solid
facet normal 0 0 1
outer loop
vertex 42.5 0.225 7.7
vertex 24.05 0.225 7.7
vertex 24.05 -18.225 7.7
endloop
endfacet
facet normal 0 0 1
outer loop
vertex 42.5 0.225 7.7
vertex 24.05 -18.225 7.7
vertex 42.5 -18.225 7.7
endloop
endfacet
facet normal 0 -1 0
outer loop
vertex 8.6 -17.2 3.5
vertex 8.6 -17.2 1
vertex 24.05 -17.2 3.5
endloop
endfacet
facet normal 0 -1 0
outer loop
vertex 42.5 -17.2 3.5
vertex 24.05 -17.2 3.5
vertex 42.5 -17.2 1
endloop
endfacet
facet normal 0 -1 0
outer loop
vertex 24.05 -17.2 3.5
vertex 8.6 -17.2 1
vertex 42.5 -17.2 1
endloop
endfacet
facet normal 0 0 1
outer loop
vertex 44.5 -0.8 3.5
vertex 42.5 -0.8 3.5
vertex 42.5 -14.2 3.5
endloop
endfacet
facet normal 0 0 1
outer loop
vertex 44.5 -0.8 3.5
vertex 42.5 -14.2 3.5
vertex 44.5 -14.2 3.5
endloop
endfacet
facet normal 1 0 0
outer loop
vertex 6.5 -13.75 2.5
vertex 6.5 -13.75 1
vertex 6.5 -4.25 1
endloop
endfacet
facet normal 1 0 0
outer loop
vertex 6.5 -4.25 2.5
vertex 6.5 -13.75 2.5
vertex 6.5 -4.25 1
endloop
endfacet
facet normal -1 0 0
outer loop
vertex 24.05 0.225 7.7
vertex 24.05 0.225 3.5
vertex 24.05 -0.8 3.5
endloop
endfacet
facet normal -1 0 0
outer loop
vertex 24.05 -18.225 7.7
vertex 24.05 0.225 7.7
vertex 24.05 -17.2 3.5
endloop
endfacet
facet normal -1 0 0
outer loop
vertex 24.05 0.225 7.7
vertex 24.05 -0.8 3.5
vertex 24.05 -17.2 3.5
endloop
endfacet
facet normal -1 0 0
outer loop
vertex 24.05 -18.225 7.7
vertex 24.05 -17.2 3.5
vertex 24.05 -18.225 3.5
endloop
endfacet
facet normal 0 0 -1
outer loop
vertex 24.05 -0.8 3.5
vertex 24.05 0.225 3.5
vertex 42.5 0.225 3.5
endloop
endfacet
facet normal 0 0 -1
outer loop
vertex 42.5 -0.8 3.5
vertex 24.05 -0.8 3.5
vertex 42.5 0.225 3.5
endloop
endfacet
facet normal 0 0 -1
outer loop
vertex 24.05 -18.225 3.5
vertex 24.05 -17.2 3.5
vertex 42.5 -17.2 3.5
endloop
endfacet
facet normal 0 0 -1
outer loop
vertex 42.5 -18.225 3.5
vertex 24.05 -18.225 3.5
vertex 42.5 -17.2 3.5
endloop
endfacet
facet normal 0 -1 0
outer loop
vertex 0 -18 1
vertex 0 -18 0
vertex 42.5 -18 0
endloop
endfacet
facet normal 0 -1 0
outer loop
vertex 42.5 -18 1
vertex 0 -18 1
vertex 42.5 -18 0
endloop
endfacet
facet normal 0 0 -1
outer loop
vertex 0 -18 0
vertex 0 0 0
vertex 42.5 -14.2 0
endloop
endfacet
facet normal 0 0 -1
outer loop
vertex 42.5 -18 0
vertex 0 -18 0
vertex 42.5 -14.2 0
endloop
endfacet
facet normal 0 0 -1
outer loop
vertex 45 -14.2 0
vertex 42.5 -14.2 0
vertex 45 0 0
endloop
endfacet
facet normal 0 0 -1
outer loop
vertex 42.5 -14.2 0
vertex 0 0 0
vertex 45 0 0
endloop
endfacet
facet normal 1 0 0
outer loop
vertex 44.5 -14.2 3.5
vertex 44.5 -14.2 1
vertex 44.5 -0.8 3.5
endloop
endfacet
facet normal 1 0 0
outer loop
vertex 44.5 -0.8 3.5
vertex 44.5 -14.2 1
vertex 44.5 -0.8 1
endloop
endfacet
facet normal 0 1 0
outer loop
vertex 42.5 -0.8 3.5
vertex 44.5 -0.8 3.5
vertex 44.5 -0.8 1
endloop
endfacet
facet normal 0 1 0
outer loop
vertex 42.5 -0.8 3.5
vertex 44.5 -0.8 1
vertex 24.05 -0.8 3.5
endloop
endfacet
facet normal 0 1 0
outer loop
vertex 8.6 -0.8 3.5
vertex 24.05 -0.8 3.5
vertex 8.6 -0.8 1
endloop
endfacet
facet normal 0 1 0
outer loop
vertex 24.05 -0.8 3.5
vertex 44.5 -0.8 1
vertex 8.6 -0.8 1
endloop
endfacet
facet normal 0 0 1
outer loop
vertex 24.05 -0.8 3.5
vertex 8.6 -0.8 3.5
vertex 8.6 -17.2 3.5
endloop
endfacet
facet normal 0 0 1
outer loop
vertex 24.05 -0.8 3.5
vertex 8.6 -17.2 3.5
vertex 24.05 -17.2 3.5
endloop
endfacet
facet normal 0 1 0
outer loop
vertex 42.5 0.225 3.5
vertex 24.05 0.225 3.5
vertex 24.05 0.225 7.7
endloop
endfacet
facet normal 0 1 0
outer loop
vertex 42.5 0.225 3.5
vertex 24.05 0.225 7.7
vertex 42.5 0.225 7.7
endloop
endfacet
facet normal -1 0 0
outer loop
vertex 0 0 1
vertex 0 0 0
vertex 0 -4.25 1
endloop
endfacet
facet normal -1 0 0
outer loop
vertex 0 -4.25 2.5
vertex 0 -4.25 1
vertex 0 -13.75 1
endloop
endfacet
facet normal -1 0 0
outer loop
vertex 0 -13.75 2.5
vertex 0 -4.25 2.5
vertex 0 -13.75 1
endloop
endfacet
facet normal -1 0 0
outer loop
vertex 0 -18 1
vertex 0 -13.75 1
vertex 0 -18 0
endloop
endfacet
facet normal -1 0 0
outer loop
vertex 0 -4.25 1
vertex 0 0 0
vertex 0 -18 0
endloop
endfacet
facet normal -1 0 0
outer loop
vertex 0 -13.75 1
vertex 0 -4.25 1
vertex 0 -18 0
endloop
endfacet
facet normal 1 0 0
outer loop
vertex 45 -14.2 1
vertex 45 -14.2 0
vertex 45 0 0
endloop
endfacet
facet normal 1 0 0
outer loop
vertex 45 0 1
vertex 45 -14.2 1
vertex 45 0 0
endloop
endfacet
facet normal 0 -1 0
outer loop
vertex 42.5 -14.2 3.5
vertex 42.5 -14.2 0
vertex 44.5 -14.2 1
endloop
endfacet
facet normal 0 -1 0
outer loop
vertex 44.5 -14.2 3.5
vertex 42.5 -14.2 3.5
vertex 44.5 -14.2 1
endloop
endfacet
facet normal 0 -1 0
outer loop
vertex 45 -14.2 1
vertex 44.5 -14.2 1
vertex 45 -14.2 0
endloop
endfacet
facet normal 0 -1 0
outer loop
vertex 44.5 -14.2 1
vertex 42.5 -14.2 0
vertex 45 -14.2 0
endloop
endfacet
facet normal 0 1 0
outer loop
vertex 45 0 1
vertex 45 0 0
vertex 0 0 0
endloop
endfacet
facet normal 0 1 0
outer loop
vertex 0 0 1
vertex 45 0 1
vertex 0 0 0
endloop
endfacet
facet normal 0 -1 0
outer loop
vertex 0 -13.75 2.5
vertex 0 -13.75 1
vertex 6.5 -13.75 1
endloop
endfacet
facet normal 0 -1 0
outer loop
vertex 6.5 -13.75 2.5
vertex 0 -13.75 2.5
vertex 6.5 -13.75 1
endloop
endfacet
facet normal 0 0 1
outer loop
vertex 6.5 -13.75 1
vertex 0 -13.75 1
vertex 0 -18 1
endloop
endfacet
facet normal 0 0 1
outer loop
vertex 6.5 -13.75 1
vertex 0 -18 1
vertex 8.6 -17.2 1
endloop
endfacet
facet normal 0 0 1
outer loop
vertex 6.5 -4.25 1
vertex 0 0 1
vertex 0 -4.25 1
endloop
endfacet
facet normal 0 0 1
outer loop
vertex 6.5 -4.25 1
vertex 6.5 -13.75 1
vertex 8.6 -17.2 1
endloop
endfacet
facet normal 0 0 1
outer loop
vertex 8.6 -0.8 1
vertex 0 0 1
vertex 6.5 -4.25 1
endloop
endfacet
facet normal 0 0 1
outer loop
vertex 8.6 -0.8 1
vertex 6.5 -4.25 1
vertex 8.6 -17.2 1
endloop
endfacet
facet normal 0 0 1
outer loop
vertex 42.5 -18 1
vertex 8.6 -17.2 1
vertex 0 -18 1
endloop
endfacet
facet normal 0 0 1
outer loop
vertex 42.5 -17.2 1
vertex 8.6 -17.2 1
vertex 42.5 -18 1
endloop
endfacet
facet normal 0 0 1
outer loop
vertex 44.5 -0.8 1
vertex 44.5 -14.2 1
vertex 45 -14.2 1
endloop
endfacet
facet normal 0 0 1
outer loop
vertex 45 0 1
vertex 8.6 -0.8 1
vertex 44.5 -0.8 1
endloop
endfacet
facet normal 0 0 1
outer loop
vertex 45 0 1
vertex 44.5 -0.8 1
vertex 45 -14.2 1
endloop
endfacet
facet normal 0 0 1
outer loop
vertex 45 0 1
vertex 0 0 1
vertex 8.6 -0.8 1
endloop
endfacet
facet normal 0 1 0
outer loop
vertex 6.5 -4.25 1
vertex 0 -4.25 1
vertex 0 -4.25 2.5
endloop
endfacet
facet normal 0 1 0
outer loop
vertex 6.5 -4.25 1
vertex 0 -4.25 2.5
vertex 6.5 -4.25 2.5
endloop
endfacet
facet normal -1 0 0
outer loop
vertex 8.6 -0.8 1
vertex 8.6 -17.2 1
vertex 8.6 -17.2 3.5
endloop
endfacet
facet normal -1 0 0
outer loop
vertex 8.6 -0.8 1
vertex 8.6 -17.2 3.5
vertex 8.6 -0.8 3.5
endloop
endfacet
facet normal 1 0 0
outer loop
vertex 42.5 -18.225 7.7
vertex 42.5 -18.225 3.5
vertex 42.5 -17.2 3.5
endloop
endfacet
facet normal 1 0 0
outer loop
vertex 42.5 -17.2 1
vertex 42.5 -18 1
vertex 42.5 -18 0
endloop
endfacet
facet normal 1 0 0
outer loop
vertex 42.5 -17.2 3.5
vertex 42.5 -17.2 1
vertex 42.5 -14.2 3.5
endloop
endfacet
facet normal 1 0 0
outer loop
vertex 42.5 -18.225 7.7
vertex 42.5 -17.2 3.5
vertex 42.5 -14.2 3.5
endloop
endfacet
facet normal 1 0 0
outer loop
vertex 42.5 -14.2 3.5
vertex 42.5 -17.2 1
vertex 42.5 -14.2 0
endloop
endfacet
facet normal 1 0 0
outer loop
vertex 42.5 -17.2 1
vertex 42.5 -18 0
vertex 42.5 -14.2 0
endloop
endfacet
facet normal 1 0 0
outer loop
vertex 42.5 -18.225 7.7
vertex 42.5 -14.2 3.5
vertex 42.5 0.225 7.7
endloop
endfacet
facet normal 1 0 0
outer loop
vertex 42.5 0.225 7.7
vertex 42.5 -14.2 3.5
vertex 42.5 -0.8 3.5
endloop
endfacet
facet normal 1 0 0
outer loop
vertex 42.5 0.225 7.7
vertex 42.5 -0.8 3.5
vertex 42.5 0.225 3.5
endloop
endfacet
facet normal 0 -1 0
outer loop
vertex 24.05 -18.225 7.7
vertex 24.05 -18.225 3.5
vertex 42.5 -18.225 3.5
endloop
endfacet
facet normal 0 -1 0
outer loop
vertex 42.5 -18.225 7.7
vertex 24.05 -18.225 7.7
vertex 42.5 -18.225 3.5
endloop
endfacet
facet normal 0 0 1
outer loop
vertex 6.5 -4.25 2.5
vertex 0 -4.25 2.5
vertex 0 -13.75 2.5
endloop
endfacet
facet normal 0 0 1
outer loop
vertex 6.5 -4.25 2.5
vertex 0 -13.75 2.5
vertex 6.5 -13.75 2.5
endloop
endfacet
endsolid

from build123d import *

# Parameters (mm, degrees)
F0_W     = 6.5
F0_H     = 9.5
F0_W_2   = 2
F0_H_2   = 13.4
F0_W_3   = 15.45
F0_H_3   = 16.4
F0_W_4   = 18.45
F0_H_4   = 0.8
F1_DEPTH = 1
F2_DEPTH = 3.5
F3_START = 3.5
F0_H_5   = 0.225
F3_DEPTH = 4.2
F4_DEPTH = 2.5


with BuildPart() as f1:
    # F0 (on Top) → F1 (new body)
    with BuildSketch(Plane.XY):
        with Locations((3.25, -9)):
            Rectangle(F0_W, F0_H)
        with Locations((43.5, -7.5)):
            Rectangle(F0_W_2, F0_H_2)
        Polygon((45, 0), (42.5, 0), (42.5, -0.8), (44.5, -0.8), (44.5, -14.2), (45, -14.2), align=None)
        with Locations((16.325, -9)):
            Rectangle(F0_W_3, F0_H_3)
        Polygon((42.5, -0.8), (24.05, -0.8), (24.05, -17.2), (42.5, -17.2), (42.5, -14.2), align=None)
        with Locations((33.275, -0.4)):
            Rectangle(F0_W_4, F0_H_4)
        Polygon((24.05, 0), (0, 0), (0, -4.25), (6.5, -4.25), (6.5, -13.75), (0, -13.75), (0, -18), (24.05, -18), (24.05, -17.2), (8.6, -17.2), (8.6, -0.8), (24.05, -0.8), align=None)
        with Locations((33.275, -17.6)):
            Rectangle(F0_W_4, F0_H_4)
    extrude(amount=F1_DEPTH)

    # F0 (on Top) → F2 (join)
    with BuildSketch(Plane.XY):
        with Locations((16.325, -9)):
            Rectangle(F0_W_3, F0_H_3)
        Polygon((42.5, -0.8), (24.05, -0.8), (24.05, -17.2), (42.5, -17.2), (42.5, -14.2), align=None)
        with Locations((43.5, -7.5)):
            Rectangle(F0_W_2, F0_H_2)
    extrude(amount=F2_DEPTH)

    # F0 (on Top) → F3 (join)
    with BuildSketch(Plane.XY.offset(F3_START)):
        with Locations((33.275, -0.4)):
            Rectangle(F0_W_4, F0_H_4)
        with Locations((33.275, 0.1125)):
            Rectangle(F0_W_4, F0_H_5)
        Polygon((42.5, -0.8), (24.05, -0.8), (24.05, -17.2), (42.5, -17.2), (42.5, -14.2), align=None)
        with Locations((33.275, -17.6)):
            Rectangle(F0_W_4, F0_H_4)
        with Locations((33.275, -18.1125)):
            Rectangle(F0_W_4, F0_H_5)
    extrude(amount=F3_DEPTH)

    # F0 (on Top) → F4 (join)
    with BuildSketch(Plane.XY):
        with Locations((3.25, -9)):
            Rectangle(F0_W, F0_H)
    extrude(amount=F4_DEPTH)


solid = f1.part
